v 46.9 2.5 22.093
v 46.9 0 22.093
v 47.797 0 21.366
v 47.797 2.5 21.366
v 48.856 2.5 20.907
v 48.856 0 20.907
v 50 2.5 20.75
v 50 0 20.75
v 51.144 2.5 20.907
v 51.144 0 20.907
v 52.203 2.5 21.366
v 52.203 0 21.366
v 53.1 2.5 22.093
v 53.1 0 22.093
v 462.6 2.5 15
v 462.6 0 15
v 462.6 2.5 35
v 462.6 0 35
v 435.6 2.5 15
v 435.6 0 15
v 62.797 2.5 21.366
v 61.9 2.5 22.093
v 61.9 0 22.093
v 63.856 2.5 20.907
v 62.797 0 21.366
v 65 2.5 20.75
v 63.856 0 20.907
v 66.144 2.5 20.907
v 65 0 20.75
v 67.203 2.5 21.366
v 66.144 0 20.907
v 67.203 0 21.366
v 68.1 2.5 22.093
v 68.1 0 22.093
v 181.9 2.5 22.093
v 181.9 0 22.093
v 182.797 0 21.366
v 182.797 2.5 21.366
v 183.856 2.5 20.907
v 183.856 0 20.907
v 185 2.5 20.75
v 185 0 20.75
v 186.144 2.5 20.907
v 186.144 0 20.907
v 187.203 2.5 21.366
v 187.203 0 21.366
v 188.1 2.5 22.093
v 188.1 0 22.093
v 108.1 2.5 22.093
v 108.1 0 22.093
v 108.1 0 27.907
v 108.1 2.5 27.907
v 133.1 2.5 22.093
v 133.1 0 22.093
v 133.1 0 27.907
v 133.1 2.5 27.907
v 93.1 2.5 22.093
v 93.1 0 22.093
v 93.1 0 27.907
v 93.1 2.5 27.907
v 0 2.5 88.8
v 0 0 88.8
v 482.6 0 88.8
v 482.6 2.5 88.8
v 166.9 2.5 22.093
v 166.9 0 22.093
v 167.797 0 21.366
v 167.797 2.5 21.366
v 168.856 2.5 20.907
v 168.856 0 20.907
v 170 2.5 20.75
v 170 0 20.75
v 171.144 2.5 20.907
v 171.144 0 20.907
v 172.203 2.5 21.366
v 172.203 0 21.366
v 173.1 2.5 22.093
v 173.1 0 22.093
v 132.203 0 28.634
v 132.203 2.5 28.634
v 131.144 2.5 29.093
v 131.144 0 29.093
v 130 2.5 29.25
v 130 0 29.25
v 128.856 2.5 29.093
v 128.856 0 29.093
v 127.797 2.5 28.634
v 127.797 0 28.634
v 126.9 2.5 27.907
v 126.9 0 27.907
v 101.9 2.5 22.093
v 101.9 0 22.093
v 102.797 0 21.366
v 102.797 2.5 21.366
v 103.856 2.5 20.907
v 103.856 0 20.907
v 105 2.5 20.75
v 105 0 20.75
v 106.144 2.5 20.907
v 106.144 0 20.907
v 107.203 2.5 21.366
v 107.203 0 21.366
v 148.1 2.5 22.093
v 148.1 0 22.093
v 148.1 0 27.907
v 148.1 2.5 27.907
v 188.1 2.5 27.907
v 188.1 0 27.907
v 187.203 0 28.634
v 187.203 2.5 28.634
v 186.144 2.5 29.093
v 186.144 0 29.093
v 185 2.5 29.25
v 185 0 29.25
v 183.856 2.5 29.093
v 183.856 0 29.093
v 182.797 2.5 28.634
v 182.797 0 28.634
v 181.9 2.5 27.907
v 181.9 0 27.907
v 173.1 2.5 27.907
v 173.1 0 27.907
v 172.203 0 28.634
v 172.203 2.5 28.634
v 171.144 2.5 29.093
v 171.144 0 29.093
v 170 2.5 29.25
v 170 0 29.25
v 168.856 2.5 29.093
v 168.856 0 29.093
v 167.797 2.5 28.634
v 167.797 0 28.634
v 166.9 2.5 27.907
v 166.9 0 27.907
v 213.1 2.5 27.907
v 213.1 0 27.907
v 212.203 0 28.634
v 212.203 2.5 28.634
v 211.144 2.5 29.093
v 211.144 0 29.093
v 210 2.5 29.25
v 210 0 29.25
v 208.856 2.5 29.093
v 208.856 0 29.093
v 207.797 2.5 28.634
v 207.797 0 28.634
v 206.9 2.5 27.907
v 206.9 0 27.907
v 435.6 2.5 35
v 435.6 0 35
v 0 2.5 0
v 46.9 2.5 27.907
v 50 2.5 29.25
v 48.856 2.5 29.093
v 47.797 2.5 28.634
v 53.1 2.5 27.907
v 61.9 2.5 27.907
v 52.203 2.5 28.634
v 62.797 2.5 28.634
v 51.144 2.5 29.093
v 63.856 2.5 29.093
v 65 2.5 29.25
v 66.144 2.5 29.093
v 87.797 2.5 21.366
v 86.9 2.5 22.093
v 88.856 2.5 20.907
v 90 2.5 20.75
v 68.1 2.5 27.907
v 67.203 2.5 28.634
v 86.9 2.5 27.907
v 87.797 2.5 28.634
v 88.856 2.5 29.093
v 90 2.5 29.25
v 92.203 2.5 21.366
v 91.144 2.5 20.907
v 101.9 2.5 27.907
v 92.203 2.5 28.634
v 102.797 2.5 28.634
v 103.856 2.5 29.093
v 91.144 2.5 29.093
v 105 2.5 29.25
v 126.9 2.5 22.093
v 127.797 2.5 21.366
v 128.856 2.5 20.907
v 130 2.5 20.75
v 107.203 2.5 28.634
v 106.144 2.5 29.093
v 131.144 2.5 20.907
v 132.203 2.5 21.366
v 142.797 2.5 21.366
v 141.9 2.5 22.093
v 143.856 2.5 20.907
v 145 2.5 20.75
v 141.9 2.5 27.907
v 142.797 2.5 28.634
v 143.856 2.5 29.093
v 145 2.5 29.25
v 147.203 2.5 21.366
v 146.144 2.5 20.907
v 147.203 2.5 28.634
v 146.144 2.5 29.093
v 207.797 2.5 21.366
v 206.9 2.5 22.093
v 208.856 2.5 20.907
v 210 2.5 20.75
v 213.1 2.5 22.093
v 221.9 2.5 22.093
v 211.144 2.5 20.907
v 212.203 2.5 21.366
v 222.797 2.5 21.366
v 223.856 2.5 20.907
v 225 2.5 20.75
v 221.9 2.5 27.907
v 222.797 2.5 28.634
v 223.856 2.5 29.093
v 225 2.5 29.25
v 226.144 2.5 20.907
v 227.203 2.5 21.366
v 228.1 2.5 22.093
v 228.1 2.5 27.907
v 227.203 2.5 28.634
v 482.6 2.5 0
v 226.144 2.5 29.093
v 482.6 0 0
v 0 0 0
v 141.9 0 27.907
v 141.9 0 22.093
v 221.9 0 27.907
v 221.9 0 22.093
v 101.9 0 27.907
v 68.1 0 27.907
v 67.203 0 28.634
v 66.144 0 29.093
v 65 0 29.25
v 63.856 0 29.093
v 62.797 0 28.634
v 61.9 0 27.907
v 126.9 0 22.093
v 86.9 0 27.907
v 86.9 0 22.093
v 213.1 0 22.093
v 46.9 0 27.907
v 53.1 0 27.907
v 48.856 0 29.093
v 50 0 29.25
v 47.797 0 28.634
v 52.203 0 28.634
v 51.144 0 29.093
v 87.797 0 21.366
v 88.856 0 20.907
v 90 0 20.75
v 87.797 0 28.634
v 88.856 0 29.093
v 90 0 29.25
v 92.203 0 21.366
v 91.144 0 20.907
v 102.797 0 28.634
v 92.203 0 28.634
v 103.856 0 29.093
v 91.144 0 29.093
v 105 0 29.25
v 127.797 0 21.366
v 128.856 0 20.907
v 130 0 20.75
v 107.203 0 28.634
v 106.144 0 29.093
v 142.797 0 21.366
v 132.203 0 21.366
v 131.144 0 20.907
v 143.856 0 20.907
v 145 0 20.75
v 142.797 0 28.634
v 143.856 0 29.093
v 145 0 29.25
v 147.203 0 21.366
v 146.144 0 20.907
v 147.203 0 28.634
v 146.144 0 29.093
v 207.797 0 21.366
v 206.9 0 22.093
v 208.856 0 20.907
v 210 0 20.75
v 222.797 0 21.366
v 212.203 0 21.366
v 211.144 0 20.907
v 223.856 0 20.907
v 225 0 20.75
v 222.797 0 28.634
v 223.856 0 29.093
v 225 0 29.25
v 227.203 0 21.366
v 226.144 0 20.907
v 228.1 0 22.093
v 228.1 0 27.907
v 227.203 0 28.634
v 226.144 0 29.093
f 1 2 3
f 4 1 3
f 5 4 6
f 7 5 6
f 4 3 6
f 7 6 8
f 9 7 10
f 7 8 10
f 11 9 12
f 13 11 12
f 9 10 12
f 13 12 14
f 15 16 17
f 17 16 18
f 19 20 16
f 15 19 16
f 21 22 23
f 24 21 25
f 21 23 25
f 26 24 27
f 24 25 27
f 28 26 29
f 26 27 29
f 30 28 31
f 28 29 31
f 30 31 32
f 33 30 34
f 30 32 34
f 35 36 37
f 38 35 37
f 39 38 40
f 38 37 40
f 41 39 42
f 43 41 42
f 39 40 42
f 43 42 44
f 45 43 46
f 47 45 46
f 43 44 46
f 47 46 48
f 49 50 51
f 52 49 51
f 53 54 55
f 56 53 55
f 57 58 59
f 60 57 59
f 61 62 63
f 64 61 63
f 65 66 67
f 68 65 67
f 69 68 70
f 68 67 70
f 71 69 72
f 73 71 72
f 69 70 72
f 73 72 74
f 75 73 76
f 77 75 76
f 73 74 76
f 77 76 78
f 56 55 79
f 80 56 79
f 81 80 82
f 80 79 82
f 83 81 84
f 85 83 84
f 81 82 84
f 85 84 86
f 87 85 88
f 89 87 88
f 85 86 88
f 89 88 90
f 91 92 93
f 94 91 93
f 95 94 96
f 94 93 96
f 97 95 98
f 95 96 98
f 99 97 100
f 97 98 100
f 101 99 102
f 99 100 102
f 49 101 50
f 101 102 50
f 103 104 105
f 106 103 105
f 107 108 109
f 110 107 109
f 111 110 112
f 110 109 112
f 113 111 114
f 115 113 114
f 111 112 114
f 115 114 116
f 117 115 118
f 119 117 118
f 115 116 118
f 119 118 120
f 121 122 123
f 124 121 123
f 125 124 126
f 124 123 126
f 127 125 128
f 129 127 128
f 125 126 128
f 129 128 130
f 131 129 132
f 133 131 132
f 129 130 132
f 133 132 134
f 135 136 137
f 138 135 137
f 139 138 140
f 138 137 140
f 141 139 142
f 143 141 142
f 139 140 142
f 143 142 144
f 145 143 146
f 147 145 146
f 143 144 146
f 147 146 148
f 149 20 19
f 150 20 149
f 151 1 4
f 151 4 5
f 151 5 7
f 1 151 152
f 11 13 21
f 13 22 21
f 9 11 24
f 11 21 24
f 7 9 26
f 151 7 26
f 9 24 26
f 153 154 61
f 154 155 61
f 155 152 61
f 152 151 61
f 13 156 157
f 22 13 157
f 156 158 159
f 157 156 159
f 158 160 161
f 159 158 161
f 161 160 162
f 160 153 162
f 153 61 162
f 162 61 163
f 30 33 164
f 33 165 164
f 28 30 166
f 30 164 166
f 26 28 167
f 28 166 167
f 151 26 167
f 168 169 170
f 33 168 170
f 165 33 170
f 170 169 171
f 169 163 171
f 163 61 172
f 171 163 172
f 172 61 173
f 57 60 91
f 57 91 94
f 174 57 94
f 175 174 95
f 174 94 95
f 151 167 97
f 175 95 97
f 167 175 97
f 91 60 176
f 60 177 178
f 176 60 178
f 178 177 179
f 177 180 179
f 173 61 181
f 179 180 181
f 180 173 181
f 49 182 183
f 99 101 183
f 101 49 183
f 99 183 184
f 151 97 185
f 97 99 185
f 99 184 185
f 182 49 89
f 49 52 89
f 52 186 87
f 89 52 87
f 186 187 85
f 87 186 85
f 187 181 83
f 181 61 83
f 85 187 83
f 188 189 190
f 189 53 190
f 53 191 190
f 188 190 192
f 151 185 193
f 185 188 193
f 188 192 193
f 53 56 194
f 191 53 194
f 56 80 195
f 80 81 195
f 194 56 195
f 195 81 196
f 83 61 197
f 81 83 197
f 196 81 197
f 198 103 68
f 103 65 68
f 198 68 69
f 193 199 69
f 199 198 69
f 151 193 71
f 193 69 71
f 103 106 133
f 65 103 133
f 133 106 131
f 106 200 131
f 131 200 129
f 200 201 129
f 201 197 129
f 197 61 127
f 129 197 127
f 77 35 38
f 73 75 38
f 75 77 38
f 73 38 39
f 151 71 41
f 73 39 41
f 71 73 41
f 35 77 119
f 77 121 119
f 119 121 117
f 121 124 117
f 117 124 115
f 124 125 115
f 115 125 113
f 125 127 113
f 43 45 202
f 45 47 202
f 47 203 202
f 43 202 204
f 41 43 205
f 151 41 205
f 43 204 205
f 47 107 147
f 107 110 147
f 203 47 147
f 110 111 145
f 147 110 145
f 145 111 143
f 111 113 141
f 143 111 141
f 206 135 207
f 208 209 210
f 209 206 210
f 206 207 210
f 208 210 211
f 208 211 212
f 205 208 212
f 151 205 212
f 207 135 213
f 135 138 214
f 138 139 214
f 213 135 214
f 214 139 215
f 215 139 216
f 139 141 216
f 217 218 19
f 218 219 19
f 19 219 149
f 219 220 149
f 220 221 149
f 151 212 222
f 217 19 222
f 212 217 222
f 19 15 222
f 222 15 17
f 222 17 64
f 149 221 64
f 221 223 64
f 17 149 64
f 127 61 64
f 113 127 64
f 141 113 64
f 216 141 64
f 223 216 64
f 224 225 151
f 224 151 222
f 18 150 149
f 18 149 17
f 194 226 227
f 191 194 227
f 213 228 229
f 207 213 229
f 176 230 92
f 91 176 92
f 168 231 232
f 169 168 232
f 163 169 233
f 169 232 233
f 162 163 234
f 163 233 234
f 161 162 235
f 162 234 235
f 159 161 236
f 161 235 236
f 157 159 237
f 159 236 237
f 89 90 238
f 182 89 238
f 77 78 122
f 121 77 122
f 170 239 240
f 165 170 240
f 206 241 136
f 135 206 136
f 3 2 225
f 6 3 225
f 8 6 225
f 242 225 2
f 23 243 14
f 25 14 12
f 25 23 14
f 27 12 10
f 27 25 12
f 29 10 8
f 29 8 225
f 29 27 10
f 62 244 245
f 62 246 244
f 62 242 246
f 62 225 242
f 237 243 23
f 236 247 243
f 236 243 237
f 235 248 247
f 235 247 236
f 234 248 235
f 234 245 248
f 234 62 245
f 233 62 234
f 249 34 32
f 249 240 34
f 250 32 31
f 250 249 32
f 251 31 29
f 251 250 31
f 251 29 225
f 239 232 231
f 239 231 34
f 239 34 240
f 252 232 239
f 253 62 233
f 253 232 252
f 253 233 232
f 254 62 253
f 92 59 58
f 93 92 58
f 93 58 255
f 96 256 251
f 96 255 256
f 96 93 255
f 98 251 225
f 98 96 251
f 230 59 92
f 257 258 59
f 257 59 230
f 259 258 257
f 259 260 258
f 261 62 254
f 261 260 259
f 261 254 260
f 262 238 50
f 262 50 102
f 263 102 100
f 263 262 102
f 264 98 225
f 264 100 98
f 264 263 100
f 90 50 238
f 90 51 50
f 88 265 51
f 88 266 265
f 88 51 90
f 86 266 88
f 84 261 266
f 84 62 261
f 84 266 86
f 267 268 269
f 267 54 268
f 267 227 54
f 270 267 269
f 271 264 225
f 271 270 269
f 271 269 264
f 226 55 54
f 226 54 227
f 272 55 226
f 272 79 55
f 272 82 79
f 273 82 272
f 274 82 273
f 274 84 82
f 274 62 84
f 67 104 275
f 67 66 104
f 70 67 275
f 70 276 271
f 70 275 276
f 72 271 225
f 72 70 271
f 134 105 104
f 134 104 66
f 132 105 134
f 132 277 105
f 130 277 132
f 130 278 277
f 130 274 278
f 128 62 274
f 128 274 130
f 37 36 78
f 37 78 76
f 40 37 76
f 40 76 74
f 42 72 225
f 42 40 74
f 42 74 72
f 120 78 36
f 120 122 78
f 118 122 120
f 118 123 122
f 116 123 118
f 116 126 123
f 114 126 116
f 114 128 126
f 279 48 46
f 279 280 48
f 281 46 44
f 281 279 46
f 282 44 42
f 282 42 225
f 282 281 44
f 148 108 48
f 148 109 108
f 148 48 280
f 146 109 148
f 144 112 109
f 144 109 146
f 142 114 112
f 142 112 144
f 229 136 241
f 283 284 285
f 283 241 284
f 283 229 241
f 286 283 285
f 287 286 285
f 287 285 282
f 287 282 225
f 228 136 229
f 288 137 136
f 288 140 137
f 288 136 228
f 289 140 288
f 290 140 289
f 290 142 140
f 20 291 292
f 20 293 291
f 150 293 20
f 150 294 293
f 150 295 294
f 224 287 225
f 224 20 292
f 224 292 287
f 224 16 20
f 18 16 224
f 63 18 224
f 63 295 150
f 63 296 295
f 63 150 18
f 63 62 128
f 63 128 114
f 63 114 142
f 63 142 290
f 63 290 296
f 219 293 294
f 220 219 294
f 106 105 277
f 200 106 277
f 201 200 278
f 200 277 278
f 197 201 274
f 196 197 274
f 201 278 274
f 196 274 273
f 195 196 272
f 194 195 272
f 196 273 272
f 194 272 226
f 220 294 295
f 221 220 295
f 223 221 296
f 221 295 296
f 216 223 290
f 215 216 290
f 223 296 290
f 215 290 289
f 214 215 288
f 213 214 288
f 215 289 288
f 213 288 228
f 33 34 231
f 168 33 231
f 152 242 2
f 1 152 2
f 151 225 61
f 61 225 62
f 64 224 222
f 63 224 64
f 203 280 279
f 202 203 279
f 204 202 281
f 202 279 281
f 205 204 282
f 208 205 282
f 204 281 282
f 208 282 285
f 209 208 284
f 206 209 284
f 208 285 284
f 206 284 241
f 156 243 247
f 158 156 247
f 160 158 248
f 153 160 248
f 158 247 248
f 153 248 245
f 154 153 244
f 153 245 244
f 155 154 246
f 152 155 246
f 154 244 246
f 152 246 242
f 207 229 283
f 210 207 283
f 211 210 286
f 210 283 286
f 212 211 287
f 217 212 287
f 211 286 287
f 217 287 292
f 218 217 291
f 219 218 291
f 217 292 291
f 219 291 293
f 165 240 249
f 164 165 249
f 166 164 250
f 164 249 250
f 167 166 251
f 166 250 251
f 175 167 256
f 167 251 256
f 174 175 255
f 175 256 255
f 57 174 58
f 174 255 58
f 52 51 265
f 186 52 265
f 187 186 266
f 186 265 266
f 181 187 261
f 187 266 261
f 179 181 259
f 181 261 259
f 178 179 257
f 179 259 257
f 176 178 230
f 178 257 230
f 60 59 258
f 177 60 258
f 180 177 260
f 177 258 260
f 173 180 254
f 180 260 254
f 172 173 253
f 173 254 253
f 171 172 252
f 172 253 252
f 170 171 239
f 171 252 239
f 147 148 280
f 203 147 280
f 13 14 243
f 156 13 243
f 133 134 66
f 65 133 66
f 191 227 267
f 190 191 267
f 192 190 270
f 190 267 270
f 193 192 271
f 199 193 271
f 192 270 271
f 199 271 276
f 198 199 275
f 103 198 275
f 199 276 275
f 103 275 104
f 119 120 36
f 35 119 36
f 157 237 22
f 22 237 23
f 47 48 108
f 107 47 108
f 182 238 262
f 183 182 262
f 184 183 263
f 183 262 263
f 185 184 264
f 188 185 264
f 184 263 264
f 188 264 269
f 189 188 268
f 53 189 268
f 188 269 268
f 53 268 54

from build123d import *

# Parameters (mm, degrees)
F0_W     = 482.6
F0_H     = 88.8
F2_DEPTH = 2.5
F1_W     = 27
F1_H     = 20
F3_DEPTH = 2.501


with BuildPart() as f2:
    # F0 (on Front) → F2 (new body)
    with BuildSketch(Plane.XZ):
        with Locations((241.3, 44.4)):
            Rectangle(F0_W, F0_H)
    extrude(amount=-F2_DEPTH)

    # F1 (on face) → F3 (cut, through all)
    with BuildSketch(Plane.XZ):
        with Locations((449.1, 25)):
            Rectangle(F1_W, F1_H)
        with BuildLine():
            Line((46.9, 27.907318), (46.9, 22.092682))
            ThreePointArc((46.9, 22.092682), (50, 20.75), (53.1, 22.092682))
            Line((53.1, 22.092682), (53.1, 27.907318))
            ThreePointArc((53.1, 27.907318), (50, 29.25), (46.9, 27.907318))
        make_face()
        with BuildLine():
            Line((61.9, 27.907318), (61.9, 22.092682))
            ThreePointArc((61.9, 22.092682), (65, 20.75), (68.1, 22.092682))
            Line((68.1, 22.092682), (68.1, 27.907318))
            ThreePointArc((68.1, 27.907318), (65, 29.25), (61.9, 27.907318))
        make_face()
        with BuildLine():
            Line((108.1, 22.092682), (108.1, 27.907318))
            ThreePointArc((108.1, 27.907318), (105, 29.25), (101.9, 27.907318))
            Line((101.9, 27.907318), (101.9, 22.092682))
            ThreePointArc((101.9, 22.092682), (105, 20.75), (108.1, 22.092682))
        make_face()
        with BuildLine():
            Line((93.1, 22.092682), (93.1, 27.907318))
            ThreePointArc((93.1, 27.907318), (90, 29.25), (86.9, 27.907318))
            Line((86.9, 27.907318), (86.9, 22.092682))
            ThreePointArc((86.9, 22.092682), (90, 20.75), (93.1, 22.092682))
        make_face()
        with BuildLine():
            Line((148.1, 22.092682), (148.1, 27.907318))
            ThreePointArc((148.1, 27.907318), (145, 29.25), (141.9, 27.907318))
            Line((141.9, 27.907318), (141.9, 22.092682))
            ThreePointArc((141.9, 22.092682), (145, 20.75), (148.1, 22.092682))
        make_face()
        with BuildLine():
            Line((133.1, 22.092682), (133.1, 27.907318))
            ThreePointArc((133.1, 27.907318), (130, 29.25), (126.9, 27.907318))
            Line((126.9, 27.907318), (126.9, 22.092682))
            ThreePointArc((126.9, 22.092682), (130, 20.75), (133.1, 22.092682))
        make_face()
        with BuildLine():
            Line((188.1, 22.092682), (188.1, 27.907318))
            ThreePointArc((188.1, 27.907318), (185, 29.25), (181.9, 27.907318))
            Line((181.9, 27.907318), (181.9, 22.092682))
            ThreePointArc((181.9, 22.092682), (185, 20.75), (188.1, 22.092682))
        make_face()
        with BuildLine():
            Line((173.1, 22.092682), (173.1, 27.907318))
            ThreePointArc((173.1, 27.907318), (170, 29.25), (166.9, 27.907318))
            Line((166.9, 27.907318), (166.9, 22.092682))
            ThreePointArc((166.9, 22.092682), (170, 20.75), (173.1, 22.092682))
        make_face()
        with BuildLine():
            Line((228.1, 22.092682), (228.1, 27.907318))
            ThreePointArc((228.1, 27.907318), (225, 29.25), (221.9, 27.907318))
            Line((221.9, 27.907318), (221.9, 22.092682))
            ThreePointArc((221.9, 22.092682), (225, 20.75), (228.1, 22.092682))
        make_face()
        with BuildLine():
            Line((213.1, 22.092682), (213.1, 27.907318))
            ThreePointArc((213.1, 27.907318), (210, 29.25), (206.9, 27.907318))
            Line((206.9, 27.907318), (206.9, 22.092682))
            ThreePointArc((206.9, 22.092682), (210, 20.75), (213.1, 22.092682))
        make_face()
    extrude(amount=-F3_DEPTH, mode=Mode.SUBTRACT)


solid = f2.part
